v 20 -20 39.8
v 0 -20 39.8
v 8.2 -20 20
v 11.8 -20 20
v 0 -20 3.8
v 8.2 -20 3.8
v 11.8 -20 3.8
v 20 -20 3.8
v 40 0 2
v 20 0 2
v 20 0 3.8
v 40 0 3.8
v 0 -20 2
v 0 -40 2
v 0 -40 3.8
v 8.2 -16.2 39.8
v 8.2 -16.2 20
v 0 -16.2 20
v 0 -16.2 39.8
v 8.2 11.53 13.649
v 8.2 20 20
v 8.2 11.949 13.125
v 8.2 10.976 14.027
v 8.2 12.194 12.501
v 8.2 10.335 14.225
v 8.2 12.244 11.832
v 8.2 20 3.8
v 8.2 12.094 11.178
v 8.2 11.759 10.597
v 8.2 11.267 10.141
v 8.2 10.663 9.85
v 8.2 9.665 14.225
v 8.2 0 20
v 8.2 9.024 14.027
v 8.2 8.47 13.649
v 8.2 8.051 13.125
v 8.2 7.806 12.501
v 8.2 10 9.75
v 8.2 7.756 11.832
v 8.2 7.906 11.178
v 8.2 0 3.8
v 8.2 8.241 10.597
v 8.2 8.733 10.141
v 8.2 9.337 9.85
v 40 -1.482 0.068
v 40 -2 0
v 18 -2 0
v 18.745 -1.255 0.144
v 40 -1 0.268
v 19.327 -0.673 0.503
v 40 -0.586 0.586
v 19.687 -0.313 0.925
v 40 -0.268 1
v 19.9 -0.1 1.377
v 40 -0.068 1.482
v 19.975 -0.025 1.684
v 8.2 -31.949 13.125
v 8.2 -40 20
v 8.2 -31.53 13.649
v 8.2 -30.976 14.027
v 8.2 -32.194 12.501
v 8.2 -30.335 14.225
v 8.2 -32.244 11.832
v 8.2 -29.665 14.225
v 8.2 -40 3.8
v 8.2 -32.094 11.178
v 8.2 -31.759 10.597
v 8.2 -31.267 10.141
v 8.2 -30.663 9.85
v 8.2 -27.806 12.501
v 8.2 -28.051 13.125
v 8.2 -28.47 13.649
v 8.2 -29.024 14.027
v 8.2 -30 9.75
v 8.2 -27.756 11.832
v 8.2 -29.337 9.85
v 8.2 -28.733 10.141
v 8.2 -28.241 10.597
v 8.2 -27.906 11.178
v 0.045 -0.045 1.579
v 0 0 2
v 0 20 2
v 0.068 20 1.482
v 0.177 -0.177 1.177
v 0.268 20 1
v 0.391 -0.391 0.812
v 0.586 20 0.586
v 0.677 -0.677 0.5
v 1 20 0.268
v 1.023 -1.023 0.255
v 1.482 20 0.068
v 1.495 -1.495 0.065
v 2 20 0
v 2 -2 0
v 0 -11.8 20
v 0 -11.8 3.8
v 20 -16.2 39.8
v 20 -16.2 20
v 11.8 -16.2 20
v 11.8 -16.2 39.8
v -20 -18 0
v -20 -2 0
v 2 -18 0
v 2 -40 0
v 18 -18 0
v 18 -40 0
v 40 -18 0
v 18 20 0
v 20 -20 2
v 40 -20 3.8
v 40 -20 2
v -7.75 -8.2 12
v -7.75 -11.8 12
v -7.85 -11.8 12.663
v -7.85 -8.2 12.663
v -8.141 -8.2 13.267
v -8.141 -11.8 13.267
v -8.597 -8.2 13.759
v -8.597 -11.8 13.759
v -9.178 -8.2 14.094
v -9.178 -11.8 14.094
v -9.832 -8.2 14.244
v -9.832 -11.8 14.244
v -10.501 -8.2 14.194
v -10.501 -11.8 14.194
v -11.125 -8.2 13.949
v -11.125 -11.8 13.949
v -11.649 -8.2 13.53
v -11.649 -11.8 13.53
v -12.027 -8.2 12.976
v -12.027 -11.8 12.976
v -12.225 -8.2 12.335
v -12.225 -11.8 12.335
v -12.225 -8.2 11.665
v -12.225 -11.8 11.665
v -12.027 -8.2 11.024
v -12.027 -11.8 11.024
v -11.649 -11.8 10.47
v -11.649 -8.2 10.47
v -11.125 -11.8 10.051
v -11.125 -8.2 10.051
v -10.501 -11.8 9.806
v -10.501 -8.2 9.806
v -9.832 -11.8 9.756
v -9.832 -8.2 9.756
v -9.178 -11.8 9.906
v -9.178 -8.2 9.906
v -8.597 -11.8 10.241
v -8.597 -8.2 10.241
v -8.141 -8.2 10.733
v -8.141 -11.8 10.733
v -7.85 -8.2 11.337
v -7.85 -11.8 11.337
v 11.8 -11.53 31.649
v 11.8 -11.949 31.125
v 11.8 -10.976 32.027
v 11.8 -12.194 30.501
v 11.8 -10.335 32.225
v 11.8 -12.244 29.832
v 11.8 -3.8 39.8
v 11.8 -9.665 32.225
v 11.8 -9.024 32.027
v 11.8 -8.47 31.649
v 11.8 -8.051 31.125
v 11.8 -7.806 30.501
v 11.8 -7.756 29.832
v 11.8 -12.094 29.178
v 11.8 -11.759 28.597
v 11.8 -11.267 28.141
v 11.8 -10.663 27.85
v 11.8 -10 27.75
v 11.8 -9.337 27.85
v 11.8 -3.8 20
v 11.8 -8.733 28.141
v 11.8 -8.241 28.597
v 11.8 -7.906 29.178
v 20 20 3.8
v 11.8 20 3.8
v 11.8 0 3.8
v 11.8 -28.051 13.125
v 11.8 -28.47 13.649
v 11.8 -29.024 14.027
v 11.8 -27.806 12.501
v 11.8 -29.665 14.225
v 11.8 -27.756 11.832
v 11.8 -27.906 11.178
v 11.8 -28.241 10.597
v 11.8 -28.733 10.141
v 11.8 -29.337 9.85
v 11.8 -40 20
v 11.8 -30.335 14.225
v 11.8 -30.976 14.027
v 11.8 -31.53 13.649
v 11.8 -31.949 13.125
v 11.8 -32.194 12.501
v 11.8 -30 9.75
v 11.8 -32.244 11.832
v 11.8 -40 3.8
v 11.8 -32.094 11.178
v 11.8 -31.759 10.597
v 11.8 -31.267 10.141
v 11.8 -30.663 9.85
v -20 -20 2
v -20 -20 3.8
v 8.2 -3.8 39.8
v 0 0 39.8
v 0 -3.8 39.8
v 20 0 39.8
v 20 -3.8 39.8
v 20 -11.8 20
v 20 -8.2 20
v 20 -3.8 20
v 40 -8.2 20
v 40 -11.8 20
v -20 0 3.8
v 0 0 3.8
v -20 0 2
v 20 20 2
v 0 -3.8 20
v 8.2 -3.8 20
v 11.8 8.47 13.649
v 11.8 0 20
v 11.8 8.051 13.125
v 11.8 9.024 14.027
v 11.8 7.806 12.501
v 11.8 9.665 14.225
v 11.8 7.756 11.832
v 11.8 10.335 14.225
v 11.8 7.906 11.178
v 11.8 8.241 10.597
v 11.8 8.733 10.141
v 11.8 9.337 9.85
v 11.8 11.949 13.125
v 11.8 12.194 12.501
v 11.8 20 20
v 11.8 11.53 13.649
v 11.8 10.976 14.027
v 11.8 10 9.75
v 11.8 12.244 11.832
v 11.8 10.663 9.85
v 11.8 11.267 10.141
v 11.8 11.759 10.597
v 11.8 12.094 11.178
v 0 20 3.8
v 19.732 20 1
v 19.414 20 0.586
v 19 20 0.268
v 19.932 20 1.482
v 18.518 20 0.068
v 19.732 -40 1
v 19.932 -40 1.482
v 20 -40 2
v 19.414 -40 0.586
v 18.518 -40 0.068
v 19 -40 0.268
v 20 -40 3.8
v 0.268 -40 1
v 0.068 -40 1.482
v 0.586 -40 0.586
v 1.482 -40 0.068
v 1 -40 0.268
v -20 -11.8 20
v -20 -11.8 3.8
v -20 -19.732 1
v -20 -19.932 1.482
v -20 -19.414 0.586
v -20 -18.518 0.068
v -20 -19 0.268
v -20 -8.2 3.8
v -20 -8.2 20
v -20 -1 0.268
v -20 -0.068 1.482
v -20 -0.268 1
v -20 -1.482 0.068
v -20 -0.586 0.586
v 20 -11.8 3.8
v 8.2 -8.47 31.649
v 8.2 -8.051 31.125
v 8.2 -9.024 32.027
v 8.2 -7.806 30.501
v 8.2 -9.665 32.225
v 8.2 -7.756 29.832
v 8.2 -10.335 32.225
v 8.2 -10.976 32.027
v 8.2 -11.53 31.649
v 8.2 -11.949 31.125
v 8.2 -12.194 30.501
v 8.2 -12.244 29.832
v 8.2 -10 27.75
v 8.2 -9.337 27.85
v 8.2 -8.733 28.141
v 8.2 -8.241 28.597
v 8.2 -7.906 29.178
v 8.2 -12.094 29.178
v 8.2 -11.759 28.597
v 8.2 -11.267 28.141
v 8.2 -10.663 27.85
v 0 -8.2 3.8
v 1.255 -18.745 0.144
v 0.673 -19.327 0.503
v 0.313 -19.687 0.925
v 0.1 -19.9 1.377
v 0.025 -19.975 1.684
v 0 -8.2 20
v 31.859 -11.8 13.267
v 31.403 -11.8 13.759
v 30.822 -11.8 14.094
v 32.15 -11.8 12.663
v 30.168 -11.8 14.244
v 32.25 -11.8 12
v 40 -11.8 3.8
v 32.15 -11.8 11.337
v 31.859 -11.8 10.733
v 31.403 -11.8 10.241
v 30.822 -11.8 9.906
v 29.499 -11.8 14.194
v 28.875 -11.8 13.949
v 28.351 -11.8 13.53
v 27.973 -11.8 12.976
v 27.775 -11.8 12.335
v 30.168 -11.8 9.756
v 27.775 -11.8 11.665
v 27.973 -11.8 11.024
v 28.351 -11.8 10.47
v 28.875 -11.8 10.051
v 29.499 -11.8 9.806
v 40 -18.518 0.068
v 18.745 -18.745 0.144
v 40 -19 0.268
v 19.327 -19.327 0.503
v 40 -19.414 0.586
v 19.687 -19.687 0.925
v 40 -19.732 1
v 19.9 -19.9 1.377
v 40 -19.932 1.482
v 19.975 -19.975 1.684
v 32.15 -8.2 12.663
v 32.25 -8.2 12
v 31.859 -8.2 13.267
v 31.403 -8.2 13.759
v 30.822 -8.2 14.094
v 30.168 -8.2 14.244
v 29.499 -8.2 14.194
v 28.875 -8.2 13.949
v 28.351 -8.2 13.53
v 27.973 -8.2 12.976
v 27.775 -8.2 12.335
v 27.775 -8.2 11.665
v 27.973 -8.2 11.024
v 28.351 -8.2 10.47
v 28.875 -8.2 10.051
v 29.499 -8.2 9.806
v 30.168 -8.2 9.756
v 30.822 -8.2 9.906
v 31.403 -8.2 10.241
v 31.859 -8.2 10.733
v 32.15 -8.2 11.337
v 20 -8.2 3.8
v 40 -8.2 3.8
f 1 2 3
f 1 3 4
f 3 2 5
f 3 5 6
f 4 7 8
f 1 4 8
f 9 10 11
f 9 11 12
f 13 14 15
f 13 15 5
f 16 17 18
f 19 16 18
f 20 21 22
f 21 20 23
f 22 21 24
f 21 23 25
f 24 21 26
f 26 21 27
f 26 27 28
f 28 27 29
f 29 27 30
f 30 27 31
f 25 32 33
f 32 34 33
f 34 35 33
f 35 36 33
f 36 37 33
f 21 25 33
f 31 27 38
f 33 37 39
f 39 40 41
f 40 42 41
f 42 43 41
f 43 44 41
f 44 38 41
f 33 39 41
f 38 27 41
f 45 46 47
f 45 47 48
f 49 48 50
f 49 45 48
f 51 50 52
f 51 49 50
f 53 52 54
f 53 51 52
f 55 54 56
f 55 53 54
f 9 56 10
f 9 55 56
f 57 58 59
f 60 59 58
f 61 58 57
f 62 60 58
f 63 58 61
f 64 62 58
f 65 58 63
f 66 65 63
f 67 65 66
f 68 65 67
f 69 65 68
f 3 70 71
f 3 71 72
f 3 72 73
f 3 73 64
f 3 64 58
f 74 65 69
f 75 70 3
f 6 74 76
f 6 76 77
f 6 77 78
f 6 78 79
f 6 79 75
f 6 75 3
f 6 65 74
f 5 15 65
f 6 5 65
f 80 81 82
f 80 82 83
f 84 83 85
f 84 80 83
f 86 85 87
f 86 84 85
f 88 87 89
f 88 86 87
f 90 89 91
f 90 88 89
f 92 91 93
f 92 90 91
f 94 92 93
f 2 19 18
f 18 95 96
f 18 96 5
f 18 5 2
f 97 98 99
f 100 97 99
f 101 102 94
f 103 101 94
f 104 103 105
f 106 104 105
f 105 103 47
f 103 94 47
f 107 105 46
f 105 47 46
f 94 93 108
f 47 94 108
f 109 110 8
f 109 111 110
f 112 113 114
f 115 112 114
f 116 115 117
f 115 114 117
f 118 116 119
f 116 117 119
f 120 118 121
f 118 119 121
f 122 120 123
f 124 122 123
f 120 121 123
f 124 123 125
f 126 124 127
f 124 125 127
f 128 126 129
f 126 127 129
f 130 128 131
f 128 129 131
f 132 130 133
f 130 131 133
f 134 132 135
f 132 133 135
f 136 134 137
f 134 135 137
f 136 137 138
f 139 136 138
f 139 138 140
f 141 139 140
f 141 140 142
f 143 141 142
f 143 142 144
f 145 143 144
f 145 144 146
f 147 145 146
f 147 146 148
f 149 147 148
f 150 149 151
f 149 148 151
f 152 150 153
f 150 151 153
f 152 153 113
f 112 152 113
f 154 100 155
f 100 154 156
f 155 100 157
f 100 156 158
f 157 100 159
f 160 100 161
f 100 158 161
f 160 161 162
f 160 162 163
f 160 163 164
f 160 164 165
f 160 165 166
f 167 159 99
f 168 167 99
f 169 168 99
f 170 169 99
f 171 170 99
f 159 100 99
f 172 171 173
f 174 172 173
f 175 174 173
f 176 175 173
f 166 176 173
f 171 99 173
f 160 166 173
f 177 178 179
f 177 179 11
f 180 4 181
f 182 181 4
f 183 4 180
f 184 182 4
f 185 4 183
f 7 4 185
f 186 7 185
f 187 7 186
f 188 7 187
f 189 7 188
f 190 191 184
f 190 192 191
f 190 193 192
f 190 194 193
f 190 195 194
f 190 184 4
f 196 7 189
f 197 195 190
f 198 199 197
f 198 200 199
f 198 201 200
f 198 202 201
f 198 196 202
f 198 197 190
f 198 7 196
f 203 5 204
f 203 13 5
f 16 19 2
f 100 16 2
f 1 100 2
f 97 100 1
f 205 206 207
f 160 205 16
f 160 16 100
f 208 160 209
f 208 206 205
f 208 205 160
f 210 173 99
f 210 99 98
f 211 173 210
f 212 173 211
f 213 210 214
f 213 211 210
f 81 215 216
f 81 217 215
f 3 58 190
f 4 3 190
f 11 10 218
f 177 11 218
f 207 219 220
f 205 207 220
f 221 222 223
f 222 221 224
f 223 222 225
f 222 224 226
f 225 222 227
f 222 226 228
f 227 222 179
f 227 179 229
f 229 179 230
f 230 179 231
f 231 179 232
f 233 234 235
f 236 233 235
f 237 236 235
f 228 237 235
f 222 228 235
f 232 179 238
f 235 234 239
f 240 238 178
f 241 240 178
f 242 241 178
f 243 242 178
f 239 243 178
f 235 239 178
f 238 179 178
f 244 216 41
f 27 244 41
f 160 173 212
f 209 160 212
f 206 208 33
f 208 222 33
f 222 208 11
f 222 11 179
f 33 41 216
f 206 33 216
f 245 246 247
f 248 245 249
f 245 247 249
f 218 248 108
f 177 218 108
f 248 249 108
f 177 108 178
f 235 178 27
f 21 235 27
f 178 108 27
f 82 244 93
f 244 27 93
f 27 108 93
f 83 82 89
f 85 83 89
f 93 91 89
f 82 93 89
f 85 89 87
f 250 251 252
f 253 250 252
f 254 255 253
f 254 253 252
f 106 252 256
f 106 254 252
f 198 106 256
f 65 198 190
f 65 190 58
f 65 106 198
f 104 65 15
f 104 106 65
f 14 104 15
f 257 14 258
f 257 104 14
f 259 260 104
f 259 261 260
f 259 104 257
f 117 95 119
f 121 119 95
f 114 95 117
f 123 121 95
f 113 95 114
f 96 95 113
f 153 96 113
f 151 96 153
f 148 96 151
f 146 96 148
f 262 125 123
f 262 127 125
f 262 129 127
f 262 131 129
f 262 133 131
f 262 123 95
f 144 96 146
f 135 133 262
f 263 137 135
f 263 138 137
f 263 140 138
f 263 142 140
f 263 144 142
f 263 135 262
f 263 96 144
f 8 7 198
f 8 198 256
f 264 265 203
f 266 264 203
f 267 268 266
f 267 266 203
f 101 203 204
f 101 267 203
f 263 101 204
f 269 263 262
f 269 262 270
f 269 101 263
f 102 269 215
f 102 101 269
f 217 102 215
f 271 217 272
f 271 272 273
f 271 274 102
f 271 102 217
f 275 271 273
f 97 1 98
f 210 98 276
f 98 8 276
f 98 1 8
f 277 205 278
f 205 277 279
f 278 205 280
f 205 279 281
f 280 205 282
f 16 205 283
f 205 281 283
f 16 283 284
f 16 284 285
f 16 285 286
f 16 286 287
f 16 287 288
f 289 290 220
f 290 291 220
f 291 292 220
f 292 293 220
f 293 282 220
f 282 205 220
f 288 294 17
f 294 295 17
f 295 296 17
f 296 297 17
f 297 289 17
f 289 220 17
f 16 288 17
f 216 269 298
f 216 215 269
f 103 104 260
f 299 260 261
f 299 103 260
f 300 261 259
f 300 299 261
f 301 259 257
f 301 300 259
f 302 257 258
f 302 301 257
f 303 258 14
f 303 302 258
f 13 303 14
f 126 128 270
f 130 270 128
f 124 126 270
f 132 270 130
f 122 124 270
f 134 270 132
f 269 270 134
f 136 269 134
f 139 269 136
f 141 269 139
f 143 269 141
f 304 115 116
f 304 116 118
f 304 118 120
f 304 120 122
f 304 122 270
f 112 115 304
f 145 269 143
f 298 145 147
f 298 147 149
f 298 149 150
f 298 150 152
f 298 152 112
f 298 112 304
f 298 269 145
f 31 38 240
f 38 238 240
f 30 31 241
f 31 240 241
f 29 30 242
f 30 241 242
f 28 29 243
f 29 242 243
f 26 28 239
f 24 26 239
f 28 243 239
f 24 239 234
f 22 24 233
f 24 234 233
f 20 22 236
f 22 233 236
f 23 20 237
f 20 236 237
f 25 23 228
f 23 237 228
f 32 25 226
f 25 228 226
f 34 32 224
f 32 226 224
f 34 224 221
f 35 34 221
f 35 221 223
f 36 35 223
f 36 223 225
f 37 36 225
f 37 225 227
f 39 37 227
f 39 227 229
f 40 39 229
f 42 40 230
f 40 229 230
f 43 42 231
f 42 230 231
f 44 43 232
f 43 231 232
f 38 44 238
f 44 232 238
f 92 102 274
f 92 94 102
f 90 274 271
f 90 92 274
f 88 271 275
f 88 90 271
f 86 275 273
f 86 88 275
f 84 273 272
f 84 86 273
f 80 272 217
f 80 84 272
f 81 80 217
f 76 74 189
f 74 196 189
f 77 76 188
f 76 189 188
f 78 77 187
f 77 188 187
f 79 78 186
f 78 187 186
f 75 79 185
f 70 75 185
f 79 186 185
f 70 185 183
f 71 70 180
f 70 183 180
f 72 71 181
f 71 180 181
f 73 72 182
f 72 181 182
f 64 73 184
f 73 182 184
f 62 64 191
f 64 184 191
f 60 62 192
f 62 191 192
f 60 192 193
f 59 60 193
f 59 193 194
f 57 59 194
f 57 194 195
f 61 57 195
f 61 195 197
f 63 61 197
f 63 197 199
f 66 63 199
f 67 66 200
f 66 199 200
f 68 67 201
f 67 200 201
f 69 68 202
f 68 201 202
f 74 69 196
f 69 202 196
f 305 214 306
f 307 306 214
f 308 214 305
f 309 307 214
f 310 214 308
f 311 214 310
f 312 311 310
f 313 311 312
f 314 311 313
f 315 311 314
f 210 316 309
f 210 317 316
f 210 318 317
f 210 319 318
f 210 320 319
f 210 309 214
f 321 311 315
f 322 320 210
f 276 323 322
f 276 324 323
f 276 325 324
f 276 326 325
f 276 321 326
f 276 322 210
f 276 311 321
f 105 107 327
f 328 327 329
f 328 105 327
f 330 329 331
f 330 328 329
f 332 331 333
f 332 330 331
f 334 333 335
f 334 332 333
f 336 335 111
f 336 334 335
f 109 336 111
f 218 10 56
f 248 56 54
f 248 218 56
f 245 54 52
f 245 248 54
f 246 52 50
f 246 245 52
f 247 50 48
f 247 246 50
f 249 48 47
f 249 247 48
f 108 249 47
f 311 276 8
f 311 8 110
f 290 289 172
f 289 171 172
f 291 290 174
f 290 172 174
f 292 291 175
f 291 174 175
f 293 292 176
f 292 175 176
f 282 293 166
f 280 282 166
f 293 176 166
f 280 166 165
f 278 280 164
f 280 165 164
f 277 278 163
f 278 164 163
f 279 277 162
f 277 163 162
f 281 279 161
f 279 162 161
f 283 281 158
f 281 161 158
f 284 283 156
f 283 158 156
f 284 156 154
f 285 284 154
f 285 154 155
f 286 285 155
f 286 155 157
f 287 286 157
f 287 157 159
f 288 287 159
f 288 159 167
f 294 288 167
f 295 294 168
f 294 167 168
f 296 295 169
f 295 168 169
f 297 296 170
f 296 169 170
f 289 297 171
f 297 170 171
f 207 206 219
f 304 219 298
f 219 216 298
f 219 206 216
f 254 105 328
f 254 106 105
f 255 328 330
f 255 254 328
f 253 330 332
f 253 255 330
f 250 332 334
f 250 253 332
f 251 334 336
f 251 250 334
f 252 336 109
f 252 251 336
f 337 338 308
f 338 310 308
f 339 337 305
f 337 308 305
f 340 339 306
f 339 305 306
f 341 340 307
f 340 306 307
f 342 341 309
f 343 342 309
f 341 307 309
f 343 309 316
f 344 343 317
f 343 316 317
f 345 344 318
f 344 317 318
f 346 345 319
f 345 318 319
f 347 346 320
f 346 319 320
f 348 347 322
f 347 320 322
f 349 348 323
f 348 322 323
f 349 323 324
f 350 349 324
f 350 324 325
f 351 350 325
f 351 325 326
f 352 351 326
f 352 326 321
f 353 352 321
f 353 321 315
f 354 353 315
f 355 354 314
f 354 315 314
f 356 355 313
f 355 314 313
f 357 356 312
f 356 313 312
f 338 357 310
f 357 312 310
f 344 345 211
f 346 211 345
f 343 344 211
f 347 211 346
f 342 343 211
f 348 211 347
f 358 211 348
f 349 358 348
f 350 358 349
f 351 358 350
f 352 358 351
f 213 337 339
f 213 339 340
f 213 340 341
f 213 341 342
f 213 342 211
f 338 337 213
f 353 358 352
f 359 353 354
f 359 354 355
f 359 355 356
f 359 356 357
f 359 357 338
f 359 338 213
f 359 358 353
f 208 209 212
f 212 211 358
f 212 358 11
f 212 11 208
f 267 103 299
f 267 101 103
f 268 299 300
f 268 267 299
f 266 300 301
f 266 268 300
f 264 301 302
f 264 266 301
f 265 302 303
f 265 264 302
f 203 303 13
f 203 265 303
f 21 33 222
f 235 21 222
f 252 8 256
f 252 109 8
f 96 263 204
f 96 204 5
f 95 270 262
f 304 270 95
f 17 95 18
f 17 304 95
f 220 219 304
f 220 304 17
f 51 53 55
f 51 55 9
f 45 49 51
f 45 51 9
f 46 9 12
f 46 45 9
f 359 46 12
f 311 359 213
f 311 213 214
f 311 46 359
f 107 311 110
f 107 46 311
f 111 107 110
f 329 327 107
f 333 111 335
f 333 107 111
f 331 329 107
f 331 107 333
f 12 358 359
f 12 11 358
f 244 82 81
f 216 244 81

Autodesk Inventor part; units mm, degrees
ref_plane "YZ Plane" through (0, 0, 0) normal (1, 0, 0) x (0, 1, 0)
ref_plane "XZ Plane" through (0, 0, 0) normal (0, 1, 0) x (-1, 0, 0)
ref_plane "XY Plane" through (0, 0, 0) normal (0, 0, 1) x (1, 0, 0)
sketch "Sketch1" plane through (0, 0, 0) normal (0, 0, 1) x (1, 0, 0)
  line L0 (0, 0) -> (20, 0)
  line L1 (20, 0) -> (20, 20)
  line L2 (20, 20) -> (0, 20)
  line L3 (0, 20) -> (0, 0)
  line L4 (0, 0) -> (20, 0)
  line L5 (20, 0) -> (20, -20)
  line L6 (20, -20) -> (0, -20)
  line L7 (0, -20) -> (0, 0)
  line L8 (20, 0) -> (40, 0)
  line L9 (40, 0) -> (40, -20)
  line L10 (40, -20) -> (20, -20)
  line L11 (20, -20) -> (20, 0)
  line L12 (0, -20) -> (-20, -20)
  line L13 (-20, -20) -> (-20, 0)
  line L14 (-20, 0) -> (0, 0)
  line L15 (0, 0) -> (0, -20)
  line L16 (0, -20) -> (20, -20)
  line L17 (20, -20) -> (20, -40)
  line L18 (20, -40) -> (0, -40)
  line L19 (0, -40) -> (0, -20)
  dimension "d0" = 20
  dimension "d1" = 20
  dimension "d2" = 20
  dimension "d3" = 20
  dimension "d4" = 20
  dimension "d5" = 20
  dimension "d6" = 20
  dimension "d7" = 20
  dimension "d8" = 20
  dimension "d9" = 20
extrude "Extrusion1" add sketch "Sketch1" along normal blind 3.8
sketch "Sketch2" plane through (0, 0, 3.8) normal (0, 0, 1) x (1, 0, 0)
  line L0 (-20, 0) -> (-20, -20) projected
  line L1 (-20, -8.2) -> (0, -8.2)
  line L2 (0, -8.2) -> (0, -11.8)
  line L3 (0, -11.8) -> (-20, -11.8)
  line L4 (-20, -11.8) -> (-20, -8.2)
  line L5 (-20, -20) -> (0, -20) projected
  line L6 (0, 0) -> (20, 0)
  line L7 (20, 0) -> (20, -20)
  line L8 (20, -20) -> (0, -20)
  line L9 (0, -20) -> (0, 0)
  line L10 (40, -20) -> (40, 0) projected
  line L11 (20, -8.2) -> (40, -8.2)
  line L12 (40, -8.2) -> (40, -11.8)
  line L13 (40, -11.8) -> (20, -11.8)
  line L14 (20, -11.8) -> (20, -8.2)
  line L15 (20, 20) -> (0, 20) projected
  line L16 (8.2, 0) -> (11.8, 0)
  line L17 (11.8, 0) -> (11.8, 20)
  line L18 (11.8, 20) -> (8.2, 20)
  line L19 (8.2, 20) -> (8.2, 0)
  line L20 (0, -40) -> (20, -40) projected
  line L21 (8.2, -20) -> (11.8, -20)
  line L22 (11.8, -20) -> (11.8, -40)
  line L23 (11.8, -40) -> (8.2, -40)
  line L24 (8.2, -40) -> (8.2, -20)
  dimension "d12" = 8.2
  dimension "d13" = 8.2
  dimension "d14" = 20
  dimension "d15" = 8.2
  dimension "d16" = 8.2
  dimension "d17" = 8.2
  dimension "d18" = 8.2
  dimension "d19" = 8.2
  dimension "d20" = 8.2
extrude "Extrusion2" add sketch "Sketch2" along normal blind 16.2 contours L1 L2 L3 L0 | L9 L6 L7 L8 L2 | L19 L15 L17 L6 | L8 L22 L20 L24 | L11 L10 L13 L7
sketch "Sketch3" plane through (0, 0, 20) normal (0, 0, 1) x (1, 0, 0)
  line L0 (0, 0) -> (0, -8.2) projected
  line L1 (0, 0) -> (0, -3.8)
  line L2 (0, -3.8) -> (8.2, -3.8)
  line L3 (8.2, -3.8) -> (8.2, -16.2)
  line L4 (8.2, -16.2) -> (0, -16.2)
  line L5 (0, -11.8) -> (0, -20) projected
  line L6 (0, -16.2) -> (0, -20)
  line L7 (20, -40) -> (20, -20) projected
  line L8 (0, -20) -> (20, -20)
  line L9 (20, -20) -> (20, -16.2)
  line L10 (20, -20) -> (20, -11.8) projected
  line L11 (20, -16.2) -> (11.8, -16.2)
  line L12 (11.8, -16.2) -> (11.8, -3.8)
  line L13 (11.8, -3.8) -> (20, -3.8)
  line L14 (20, -8.2) -> (20, 0) projected
  line L15 (8.2, 0) -> (0, 0) projected
  line L16 (20, 0) -> (0, 0)
  line L17 (40, 0) -> (20, 0) projected
  line L18 (20, 0) -> (20, -3.8)
  dimension "d23" = 3.8
  dimension "d24" = 8.2
  dimension "d25" = 12.4
  dimension "d26" = 8.2
extrude "Extrusion3" add sketch "Sketch3" along normal blind 19.8
sketch "Sketch4" plane through (11.8, 0, 3.8) normal (1, 0, 0) x (0, 0, -1)
  circle A0 centre (-8.2, 10) radius 2.25
  line L0 (-16.2, 0) -> (-16.2, 20) projected
  line L1 (0, 20) -> (-16.2, 20) projected
  point P0 (3.8, 0)
  dimension "d29" = 4.5
  dimension "d30" = 8
  dimension "d31" = 10
extrude "Extrusion4" cut sketch "Sketch4" against normal through all
sketch "Sketch5" plane through (11.8, -40, 3.8) normal (1, 0, 0) x (0, 0, -1)
  circle A0 centre (-8.2, 10) radius 2.25
  line L0 (-16.2, 0) -> (-16.2, 20) projected
  line L1 (0, 0) -> (-16.2, 0) projected
  point P0 (3.8, 40)
  dimension "d34" = 4.5
  dimension "d35" = 8
  dimension "d36" = 10
extrude "Extrusion5" cut sketch "Sketch5" against normal through all
sketch "Sketch6" plane through (11.8, -16.2, 20) normal (1, 0, 0) x (0, 0, -1)
  circle A0 centre (-10, 6.2) radius 2.25
  line L0 (0, 4.4) -> (0, 8) projected
  line L1 (16.2, 16.2) -> (-19.8, 16.2) projected
  point P0 (20, 16.2)
  dimension "d39" = 4.5
  dimension "d40" = 10
  dimension "d41" = 10
extrude "Extrusion6" cut sketch "Sketch6" against normal through all
sketch "Sketch7" plane through (20, -11.8, 3.8) normal (0, -1, 0) x (1, 0, 0)
  circle A0 centre (10, 8.2) radius 2.25
  line L0 (0, 16.2) -> (20, 16.2) projected
  line L1 (20, 0) -> (20, 16.2) projected
  point P0 (-20, -3.8)
  dimension "d44" = 4.5
  dimension "d45" = 8
  dimension "d46" = 10
extrude "Extrusion7" cut sketch "Sketch7" against normal through all
sketch "Sketch8" plane through (-20, -11.8, 3.8) normal (0, -1, 0) x (1, 0, 0)
  circle A0 centre (10, 8.2) radius 2.25
  line L0 (0, 16.2) -> (20, 16.2) projected
  line L1 (0, 0) -> (0, 16.2) projected
  point P0 (20, -3.8)
  dimension "d49" = 4.5
  dimension "d50" = 8
  dimension "d51" = 10
extrude "Extrusion8" cut sketch "Sketch8" against normal through all
fillet "Fillet1" radius 2 8 edges at (-10, 0, 0) (0, 10, 0) (-10, -20, 0) (0, -30, 0) (20, -30, 0) (30, -20, 0) (30, 0, 0) (20, 10, 0)
equation "\"d13\" = d12"
equation "\"d15\" = d12"
equation "\"d16\" = d12"
equation "\"d17\" = d12"
equation "\"d18\" = d12"
equation "\"d19\" = d12"
equation "\"d20\" = d12"
equation "\"d26\" = d24"
properties part number "fourwaylockver1"
